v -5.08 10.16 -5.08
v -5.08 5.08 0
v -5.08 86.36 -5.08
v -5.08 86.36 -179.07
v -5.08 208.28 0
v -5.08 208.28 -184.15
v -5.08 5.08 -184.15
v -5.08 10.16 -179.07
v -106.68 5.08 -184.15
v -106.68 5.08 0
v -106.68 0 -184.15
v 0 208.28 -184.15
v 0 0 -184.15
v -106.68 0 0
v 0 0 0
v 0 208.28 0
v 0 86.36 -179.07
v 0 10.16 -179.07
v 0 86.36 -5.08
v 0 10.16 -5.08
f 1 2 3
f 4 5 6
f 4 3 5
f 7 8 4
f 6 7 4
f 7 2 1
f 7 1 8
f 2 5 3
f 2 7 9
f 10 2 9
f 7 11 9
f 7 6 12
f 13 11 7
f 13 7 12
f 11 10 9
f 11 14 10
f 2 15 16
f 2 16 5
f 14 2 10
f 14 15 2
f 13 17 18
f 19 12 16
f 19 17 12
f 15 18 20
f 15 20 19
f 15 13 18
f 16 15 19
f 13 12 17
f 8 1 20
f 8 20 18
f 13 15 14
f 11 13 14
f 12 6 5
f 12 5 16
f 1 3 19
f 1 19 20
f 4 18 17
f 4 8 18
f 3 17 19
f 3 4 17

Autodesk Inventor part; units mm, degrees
ref_plane "YZ Plane" through (0, 0, 0) normal (1, 0, 0) x (0, 1, 0)
ref_plane "XZ Plane" through (0, 0, 0) normal (0, 1, 0) x (-1, 0, 0)
ref_plane "XY Plane" through (0, 0, 0) normal (0, 0, 1) x (1, 0, 0)
sketch "Sketch1" plane through (0, 0, 0) normal (0, 1, 0) x (-1, 0, 0)
  line L0 (0, 0) -> (106.68, 0)
  line L1 (106.68, 0) -> (106.68, -184.15)
  line L2 (106.68, -184.15) -> (0, -184.15)
  line L3 (0, -184.15) -> (0, 0)
  dimension "d0" = 184.15
  dimension "d1" = 106.68
extrude "Extrusion1" add sketch "Sketch1" along normal blind 5.08
sketch "Sketch2" plane through (0, 5.08, 0) normal (0, 1, 0) x (1, 0, 0)
  line L0 (-5.08, 0) -> (-5.08, 184.15)
  line L1 (0, 0) -> (0, 184.15) projected
  line L2 (-5.08, 0) -> (0, 0)
  line L3 (0, 184.15) -> (-106.68, 184.15) projected
  line L4 (-5.08, 184.15) -> (0, 184.15)
  dimension "d4" = 5.08
extrude "Extrusion2" add sketch "Sketch2" along normal blind 203.2
sketch "Sketch3" plane through (-5.08, 5.08, -184.15) normal (-1, 0, 0) x (0, 0, 1)
  line L0 (179.07, 5.08) -> (5.08, 5.08)
  line L1 (5.08, 5.08) -> (5.08, 81.28)
  line L2 (5.08, 81.28) -> (179.07, 81.28)
  line L3 (179.07, 81.28) -> (179.07, 5.08)
  line L4 (184.15, 0) -> (184.15, 203.2) projected
  line L5 (0, 0) -> (0, 203.2) projected
  line L6 (0, -5.08) -> (184.15, -5.08) projected
  dimension "d7" = 5.08
  dimension "d8" = 5.08
  dimension "d9" = 10.16
  dimension "d10" = 76.2
extrude "Extrusion3" cut sketch "Sketch3" against normal up to surface (5.08 mm away)
properties part number "Box_Bottom"
